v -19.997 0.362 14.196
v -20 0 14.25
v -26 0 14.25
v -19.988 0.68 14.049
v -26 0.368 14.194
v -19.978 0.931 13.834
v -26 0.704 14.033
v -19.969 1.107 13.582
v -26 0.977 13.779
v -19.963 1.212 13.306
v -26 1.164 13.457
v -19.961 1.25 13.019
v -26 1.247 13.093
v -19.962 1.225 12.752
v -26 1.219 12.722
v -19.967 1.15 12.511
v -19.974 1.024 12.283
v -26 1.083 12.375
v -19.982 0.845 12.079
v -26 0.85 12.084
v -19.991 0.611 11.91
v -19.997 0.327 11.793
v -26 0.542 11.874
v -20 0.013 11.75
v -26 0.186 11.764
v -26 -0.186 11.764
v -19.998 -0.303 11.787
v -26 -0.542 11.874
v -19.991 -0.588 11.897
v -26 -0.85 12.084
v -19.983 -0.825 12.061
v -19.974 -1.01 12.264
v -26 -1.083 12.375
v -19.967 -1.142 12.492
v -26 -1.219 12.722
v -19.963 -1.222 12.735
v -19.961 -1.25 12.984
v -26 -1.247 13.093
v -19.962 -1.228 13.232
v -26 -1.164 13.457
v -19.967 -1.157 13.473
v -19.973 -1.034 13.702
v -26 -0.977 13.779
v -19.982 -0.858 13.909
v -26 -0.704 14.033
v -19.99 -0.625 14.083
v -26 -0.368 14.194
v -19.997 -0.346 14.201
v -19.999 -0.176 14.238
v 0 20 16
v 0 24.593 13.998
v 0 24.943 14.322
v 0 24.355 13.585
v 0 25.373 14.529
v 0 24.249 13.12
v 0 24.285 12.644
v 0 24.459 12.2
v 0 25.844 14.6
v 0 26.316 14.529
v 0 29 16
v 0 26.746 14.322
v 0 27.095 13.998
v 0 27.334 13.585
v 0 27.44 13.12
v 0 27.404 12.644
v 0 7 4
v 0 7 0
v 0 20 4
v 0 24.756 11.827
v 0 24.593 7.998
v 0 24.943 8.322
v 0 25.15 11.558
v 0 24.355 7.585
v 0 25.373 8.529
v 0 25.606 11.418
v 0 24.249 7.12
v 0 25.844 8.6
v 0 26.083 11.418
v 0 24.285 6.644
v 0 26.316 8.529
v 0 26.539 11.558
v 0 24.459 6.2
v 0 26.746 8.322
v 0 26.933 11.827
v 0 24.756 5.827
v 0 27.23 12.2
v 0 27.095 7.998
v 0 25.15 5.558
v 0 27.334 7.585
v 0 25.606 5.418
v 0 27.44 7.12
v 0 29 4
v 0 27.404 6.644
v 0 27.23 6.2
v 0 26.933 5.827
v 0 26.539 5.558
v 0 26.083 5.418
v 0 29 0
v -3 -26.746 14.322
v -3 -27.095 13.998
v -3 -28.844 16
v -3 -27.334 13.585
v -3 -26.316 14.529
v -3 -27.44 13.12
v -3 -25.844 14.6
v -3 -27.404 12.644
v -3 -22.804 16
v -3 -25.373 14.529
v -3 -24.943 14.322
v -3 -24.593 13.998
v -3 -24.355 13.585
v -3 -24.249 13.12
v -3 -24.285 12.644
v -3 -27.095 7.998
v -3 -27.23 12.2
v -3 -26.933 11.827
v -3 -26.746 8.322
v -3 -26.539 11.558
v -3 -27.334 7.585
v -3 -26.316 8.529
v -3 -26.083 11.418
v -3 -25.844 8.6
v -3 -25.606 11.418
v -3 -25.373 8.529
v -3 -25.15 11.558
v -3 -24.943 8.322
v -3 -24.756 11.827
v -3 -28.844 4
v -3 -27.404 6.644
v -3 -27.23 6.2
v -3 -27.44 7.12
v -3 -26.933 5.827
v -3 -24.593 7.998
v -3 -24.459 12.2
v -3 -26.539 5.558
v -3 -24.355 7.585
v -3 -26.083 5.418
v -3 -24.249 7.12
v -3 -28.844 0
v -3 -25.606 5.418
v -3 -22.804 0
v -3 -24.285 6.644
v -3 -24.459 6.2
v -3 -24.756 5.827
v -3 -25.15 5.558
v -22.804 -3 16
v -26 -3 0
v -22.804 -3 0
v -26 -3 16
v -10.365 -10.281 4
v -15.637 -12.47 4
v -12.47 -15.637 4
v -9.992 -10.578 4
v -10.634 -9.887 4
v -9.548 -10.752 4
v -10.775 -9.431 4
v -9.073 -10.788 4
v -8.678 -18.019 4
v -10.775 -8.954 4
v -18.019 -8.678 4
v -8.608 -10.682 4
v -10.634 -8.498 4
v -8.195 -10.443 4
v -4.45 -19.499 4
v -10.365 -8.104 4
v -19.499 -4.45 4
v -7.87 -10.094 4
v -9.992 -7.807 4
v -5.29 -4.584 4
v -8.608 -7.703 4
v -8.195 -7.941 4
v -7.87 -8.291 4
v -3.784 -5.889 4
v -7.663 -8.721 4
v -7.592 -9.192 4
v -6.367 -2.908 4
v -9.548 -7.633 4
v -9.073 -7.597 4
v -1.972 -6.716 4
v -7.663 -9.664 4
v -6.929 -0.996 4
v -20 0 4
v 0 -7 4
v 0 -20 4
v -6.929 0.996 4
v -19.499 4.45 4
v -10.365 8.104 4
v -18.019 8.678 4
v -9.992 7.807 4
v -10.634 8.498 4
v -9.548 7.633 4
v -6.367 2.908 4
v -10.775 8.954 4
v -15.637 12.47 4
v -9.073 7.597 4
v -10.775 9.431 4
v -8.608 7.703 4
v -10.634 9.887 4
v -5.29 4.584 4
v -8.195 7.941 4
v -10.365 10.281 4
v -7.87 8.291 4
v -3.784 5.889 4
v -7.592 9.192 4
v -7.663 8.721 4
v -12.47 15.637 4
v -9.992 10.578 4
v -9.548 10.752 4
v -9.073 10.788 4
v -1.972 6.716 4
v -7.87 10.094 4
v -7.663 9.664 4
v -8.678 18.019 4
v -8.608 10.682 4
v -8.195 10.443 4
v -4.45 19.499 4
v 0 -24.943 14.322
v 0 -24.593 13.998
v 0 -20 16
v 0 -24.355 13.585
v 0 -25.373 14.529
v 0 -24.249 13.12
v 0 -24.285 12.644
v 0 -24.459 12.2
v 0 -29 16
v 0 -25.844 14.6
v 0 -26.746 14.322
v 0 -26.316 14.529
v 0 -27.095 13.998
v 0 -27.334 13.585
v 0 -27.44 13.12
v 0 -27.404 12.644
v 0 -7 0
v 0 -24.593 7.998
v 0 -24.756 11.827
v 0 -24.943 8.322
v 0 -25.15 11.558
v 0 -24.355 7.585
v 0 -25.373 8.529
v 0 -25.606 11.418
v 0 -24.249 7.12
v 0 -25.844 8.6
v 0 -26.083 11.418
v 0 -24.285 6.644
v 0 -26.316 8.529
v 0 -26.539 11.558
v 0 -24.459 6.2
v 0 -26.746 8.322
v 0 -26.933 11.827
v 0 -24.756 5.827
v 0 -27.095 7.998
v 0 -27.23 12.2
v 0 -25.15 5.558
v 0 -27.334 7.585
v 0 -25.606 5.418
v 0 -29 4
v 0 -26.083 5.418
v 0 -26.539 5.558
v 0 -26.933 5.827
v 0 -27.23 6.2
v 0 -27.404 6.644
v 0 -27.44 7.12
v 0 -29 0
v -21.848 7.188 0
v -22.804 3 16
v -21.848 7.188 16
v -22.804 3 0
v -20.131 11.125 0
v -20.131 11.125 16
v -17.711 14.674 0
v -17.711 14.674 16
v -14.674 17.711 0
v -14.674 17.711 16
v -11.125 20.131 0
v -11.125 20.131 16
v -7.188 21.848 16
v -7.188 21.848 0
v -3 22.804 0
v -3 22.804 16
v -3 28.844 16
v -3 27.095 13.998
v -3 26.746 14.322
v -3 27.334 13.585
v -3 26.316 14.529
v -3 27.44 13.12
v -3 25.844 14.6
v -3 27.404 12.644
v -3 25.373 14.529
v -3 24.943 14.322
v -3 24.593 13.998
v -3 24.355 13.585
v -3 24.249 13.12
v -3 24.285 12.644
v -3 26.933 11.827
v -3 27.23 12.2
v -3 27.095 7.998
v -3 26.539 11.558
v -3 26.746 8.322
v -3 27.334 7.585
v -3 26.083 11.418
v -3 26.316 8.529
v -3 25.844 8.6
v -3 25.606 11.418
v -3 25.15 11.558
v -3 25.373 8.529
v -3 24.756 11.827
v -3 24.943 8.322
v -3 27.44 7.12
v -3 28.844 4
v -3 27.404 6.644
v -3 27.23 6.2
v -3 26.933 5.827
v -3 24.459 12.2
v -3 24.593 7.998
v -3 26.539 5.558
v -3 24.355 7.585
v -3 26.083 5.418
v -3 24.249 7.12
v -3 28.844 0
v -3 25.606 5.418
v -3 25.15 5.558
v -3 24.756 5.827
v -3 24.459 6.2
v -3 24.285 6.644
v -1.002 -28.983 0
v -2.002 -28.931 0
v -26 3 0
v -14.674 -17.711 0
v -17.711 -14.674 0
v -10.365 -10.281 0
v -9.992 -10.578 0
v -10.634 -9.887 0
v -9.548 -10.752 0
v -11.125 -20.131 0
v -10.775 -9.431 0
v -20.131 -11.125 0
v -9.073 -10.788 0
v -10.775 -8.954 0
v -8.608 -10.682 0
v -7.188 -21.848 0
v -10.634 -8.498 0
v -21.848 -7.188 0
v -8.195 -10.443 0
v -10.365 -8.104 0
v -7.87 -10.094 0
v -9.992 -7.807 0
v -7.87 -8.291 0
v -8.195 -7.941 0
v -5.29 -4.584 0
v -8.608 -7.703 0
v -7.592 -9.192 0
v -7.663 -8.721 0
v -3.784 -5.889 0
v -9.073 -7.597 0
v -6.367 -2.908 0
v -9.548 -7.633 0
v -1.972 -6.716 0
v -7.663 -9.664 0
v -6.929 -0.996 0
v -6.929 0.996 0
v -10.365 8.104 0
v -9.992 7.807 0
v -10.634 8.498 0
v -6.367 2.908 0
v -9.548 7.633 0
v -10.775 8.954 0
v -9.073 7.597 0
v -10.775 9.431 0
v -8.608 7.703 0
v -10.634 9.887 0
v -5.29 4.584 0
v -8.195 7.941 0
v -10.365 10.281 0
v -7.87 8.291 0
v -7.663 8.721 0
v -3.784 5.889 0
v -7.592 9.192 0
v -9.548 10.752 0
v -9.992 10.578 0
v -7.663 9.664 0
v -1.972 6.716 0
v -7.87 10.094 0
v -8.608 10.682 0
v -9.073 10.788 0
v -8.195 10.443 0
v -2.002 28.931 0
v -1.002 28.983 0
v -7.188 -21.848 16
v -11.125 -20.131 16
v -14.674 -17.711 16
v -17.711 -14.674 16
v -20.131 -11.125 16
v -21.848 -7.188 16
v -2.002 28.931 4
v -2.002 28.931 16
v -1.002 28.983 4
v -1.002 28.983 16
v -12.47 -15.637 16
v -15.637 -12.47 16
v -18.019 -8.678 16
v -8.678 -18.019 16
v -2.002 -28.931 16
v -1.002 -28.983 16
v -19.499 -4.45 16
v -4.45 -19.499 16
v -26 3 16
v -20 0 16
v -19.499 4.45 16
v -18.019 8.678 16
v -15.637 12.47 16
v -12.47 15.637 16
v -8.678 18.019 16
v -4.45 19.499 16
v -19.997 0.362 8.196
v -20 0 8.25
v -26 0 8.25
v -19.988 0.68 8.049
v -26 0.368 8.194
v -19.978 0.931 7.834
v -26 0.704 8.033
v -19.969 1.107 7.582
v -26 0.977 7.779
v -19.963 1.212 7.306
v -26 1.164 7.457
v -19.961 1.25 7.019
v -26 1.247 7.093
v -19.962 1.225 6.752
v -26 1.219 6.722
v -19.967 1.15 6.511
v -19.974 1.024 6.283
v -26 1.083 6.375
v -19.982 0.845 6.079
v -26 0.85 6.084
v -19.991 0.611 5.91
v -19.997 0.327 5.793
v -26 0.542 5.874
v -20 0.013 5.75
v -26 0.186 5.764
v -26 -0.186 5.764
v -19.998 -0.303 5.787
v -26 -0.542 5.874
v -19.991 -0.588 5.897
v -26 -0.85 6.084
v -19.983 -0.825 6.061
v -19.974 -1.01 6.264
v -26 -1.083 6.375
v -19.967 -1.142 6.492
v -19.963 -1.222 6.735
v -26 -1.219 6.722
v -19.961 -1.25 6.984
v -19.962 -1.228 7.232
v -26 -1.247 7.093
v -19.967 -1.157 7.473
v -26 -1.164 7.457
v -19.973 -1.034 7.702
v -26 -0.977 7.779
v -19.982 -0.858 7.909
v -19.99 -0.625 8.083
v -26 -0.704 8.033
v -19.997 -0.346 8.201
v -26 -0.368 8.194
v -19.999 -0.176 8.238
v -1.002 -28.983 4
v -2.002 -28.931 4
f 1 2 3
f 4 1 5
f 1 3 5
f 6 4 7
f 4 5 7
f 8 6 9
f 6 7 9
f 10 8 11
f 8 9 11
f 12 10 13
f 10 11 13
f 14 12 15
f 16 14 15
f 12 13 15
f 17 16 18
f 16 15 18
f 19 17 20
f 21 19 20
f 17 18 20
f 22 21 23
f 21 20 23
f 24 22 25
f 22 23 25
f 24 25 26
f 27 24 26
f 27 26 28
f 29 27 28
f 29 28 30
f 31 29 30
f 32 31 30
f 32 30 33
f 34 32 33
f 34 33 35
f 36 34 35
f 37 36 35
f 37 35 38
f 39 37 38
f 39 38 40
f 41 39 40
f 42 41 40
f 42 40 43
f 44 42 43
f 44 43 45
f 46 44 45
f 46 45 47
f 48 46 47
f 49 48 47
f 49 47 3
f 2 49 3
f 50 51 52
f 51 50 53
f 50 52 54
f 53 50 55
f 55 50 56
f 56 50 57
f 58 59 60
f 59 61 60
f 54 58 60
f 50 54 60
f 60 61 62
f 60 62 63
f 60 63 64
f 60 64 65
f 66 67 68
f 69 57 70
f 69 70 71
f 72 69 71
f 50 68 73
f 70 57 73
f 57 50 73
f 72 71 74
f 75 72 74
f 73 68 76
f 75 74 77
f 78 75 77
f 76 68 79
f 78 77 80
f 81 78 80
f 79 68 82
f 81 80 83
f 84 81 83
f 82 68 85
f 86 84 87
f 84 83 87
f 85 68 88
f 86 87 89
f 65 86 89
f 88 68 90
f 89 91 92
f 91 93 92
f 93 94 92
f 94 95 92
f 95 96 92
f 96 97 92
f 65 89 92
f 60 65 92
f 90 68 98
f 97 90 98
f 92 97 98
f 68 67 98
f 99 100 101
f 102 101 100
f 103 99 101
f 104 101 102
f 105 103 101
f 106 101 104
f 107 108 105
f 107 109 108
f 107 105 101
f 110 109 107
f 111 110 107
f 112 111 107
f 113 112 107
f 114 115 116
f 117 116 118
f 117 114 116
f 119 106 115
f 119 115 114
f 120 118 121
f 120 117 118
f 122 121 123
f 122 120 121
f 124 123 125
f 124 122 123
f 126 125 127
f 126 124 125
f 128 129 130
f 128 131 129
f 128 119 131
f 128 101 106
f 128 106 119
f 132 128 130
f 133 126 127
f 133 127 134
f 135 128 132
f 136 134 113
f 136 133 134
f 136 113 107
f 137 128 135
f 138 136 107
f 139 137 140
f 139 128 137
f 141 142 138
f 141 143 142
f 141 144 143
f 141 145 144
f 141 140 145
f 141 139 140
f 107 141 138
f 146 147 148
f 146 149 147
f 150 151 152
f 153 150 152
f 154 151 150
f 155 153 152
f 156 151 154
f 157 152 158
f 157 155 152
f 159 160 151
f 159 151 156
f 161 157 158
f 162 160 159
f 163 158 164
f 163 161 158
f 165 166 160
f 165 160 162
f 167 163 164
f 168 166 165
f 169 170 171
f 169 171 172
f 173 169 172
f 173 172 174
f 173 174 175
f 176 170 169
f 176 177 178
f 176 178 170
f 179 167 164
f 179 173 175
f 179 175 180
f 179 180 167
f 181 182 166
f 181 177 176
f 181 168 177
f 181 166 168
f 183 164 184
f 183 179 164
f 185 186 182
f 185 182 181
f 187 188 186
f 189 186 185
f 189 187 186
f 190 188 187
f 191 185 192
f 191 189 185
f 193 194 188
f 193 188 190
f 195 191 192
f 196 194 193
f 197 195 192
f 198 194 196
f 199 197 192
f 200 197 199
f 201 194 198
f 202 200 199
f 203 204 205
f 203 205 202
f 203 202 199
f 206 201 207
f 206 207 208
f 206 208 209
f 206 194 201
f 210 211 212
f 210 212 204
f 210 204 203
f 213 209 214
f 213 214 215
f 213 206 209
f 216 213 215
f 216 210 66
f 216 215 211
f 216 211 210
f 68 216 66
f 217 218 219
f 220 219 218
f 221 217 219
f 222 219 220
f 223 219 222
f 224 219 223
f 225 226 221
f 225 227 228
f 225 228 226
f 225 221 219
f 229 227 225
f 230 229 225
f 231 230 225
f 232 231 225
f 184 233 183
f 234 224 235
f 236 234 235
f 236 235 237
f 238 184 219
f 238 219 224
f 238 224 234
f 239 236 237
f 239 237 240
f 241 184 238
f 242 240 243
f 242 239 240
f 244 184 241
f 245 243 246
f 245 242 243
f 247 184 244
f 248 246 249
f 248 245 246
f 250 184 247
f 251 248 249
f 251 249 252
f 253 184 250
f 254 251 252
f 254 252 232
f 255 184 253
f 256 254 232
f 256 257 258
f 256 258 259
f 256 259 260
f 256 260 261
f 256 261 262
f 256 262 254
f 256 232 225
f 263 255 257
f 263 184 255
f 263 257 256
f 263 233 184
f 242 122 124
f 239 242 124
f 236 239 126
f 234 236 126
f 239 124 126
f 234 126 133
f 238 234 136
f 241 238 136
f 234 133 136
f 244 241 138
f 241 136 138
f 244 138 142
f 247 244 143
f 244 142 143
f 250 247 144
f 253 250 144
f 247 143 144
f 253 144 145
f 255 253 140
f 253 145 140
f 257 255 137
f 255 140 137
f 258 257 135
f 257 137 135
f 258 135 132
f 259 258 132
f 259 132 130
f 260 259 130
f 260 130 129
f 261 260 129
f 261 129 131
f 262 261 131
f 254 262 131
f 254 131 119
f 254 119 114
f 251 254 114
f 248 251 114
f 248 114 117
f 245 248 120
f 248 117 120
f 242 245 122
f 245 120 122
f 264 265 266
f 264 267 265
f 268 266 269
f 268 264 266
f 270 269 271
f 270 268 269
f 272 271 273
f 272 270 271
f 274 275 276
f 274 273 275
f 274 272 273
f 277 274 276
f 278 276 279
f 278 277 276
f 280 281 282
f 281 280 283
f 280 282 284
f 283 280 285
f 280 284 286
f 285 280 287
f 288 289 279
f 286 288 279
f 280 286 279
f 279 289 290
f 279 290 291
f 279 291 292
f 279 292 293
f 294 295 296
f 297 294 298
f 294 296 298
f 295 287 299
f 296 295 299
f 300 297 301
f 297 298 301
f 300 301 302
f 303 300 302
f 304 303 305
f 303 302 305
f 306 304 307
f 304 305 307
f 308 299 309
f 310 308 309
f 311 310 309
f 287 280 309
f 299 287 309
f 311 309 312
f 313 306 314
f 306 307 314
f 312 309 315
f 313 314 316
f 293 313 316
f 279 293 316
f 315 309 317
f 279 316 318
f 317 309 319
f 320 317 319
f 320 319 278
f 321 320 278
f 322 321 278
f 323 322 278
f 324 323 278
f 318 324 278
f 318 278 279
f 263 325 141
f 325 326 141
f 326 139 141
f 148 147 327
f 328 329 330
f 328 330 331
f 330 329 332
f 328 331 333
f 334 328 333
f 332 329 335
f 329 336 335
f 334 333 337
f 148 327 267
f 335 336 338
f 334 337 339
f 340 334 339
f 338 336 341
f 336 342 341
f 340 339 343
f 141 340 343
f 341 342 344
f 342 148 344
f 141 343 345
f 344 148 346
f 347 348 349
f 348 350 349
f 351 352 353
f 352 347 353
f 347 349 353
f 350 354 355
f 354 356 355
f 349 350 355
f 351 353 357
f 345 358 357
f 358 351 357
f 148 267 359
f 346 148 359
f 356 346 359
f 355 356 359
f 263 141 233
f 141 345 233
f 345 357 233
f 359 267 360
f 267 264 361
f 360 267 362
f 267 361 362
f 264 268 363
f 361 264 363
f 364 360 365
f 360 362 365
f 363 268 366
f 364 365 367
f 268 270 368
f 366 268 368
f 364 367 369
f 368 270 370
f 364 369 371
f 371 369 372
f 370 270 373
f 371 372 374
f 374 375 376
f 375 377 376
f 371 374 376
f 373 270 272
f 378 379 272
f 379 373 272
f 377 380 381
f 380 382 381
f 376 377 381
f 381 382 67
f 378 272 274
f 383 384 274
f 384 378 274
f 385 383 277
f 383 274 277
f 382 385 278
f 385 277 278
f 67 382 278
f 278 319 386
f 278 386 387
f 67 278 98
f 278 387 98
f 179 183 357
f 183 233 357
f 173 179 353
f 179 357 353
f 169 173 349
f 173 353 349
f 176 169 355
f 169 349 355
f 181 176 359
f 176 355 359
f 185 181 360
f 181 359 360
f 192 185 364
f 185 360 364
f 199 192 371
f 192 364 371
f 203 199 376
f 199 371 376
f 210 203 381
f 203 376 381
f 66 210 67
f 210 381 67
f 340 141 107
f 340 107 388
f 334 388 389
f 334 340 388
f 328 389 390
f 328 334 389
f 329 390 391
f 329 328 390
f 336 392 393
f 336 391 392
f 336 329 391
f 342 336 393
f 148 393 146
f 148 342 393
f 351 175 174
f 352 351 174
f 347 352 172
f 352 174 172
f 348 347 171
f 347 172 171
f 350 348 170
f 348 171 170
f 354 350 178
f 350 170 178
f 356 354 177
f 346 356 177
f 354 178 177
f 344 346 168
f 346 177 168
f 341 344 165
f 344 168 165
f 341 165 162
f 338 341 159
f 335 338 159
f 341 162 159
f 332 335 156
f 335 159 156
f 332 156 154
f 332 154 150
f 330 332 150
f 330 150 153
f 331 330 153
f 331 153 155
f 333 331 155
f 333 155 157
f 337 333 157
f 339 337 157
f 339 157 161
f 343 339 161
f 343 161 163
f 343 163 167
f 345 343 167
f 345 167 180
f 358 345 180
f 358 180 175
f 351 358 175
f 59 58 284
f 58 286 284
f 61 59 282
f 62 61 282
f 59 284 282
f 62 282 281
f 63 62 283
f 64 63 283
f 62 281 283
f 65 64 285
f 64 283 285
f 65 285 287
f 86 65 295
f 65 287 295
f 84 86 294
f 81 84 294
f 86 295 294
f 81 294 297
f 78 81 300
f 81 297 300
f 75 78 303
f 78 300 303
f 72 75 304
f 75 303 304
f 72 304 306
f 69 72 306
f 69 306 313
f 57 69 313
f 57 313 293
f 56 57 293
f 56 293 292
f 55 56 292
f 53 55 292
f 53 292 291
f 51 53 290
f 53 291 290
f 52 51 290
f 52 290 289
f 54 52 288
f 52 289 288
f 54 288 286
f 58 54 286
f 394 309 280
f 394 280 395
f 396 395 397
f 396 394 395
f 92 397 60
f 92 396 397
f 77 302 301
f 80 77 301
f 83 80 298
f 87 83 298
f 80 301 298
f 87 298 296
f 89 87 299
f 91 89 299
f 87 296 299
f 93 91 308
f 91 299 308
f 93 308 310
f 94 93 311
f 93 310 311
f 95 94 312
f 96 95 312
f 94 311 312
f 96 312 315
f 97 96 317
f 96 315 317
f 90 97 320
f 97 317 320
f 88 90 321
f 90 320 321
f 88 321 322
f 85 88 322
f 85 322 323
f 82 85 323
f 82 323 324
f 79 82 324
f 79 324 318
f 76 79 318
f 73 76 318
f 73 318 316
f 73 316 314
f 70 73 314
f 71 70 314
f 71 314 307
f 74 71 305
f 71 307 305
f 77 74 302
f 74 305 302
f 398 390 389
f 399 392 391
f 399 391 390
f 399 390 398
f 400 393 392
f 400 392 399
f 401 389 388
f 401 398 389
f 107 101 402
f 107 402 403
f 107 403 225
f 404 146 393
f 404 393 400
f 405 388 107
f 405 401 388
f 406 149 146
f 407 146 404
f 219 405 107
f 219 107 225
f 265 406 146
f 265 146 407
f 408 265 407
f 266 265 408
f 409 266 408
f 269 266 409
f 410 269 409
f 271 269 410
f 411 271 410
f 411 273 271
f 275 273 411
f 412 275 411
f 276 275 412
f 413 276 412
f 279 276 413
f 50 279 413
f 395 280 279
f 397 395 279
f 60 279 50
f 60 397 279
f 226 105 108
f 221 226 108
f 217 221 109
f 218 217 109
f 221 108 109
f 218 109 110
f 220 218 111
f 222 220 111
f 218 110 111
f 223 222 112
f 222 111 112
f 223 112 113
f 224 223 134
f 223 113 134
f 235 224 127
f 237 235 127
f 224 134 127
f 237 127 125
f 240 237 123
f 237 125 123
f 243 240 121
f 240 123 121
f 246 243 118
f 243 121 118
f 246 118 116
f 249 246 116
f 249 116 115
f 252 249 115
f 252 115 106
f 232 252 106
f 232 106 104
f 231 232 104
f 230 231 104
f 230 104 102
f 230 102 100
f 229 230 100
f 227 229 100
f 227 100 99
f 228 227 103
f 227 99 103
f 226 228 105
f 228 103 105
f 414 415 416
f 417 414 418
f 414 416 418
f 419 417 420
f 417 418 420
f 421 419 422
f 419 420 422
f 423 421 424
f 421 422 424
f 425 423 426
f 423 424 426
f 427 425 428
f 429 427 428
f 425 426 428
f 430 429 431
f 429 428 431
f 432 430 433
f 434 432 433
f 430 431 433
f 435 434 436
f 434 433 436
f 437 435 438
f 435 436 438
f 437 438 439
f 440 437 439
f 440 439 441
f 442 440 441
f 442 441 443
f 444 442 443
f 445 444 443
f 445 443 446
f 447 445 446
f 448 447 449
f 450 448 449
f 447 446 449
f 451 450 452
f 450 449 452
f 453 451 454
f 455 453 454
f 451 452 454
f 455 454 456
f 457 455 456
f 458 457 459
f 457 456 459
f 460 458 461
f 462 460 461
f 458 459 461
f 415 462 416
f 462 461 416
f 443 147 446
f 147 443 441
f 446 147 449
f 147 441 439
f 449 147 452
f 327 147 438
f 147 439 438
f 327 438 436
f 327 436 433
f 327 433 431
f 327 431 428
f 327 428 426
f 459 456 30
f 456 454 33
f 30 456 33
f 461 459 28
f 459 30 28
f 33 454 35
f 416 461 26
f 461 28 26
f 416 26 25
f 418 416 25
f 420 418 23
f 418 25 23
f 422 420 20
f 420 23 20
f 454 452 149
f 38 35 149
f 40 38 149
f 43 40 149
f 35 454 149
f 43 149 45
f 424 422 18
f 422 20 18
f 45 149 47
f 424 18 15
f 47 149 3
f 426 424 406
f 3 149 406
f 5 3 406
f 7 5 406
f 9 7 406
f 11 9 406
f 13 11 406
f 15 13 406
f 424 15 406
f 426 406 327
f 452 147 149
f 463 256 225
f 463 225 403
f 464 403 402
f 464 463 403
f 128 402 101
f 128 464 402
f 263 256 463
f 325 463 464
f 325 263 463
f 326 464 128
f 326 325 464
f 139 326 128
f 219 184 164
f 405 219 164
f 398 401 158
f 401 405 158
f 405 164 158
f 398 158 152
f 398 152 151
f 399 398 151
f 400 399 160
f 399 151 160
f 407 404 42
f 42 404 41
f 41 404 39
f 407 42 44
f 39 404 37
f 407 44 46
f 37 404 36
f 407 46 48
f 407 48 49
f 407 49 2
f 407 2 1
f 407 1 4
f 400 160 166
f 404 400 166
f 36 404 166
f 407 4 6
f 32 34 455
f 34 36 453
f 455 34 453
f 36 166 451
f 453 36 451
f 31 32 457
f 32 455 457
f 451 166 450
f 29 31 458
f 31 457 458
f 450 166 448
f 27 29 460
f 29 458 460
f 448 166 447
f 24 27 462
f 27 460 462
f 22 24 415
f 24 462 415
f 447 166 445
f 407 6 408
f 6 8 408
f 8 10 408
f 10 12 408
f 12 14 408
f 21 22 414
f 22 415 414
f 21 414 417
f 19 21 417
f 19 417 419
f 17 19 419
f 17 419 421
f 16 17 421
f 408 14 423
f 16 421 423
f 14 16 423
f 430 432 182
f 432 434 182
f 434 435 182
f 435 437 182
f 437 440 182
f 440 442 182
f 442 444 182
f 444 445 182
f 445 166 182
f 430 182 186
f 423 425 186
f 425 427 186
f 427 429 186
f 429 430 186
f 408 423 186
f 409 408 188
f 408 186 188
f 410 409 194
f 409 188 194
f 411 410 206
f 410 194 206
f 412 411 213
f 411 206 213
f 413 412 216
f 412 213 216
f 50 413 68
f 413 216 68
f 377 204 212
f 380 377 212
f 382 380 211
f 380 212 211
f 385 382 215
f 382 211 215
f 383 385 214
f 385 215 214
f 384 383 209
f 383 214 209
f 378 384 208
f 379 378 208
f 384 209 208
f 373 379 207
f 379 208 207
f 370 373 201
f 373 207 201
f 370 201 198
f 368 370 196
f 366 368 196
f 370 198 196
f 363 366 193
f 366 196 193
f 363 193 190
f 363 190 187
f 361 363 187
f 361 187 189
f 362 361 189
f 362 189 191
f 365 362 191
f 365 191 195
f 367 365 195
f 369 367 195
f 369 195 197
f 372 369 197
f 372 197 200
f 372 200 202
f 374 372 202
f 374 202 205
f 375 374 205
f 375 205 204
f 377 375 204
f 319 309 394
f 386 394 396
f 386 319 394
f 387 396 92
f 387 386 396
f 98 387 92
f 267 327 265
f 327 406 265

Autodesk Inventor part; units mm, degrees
ref_plane "YZ Plane" through (0, 0, 0) normal (1, 0, 0) x (0, 1, 0)
ref_plane "XZ Plane" through (0, 0, 0) normal (0, 1, 0) x (-1, 0, 0)
ref_plane "XY Plane" through (0, 0, 0) normal (0, 0, 1) x (1, 0, 0)
sketch "스케치1" plane through (0, 0, 0) normal (0, 0, 1) x (1, 0, 0)
  arc A0 (0, 7) -> (0, -7) centre (0, 0) ccw
  arc A1 (0, 23) -> (0, -23) centre (0, 0) ccw
  line L0 (0, 0) -> (0, 23)
  line L1 (0, 0) -> (0, -23)
  dimension "d0" = 14
  dimension "d1" = 46
extrude "돌출1" add sketch "스케치1" along normal blind 4 contours A0 L1 A1 L0
sketch "스케치2" plane through (0, 0, 4) normal (0, 0, 1) x (1, 0, 0)
  arc A0 (0, 20) -> (0, -20) centre (0, 0) ccw
  arc A1 (0, 23) -> (0, -23) centre (0, 0) ccw
  line L0 (0, 20) -> (0, 29)
  line L1 (0, 0) -> (0, -29)
  arc A2 (-3, -28.8444) -> (0, -29) centre (0, 0) ccw
  arc A3 (0, 29) -> (-3, 28.8444) centre (0, 0) ccw
  line L2 (-3, 28.8444) -> (-3, 19.7737)
  line L3 (-3, -19.7737) -> (-3, -22.8035)
  line L4 (-3, -28.8444) -> (-3, -19.7737)
  line L5 (-3, 19.7737) -> (-3, 28.8444)
  line L6 (-3, 22.8035) -> (-3, 19.7737)
  line L7 (-3, -19.7737) -> (-3, -28.8444)
  line L8 (0, -29) -> (0, -20)
  line L9 (0, 20) -> (0, 29)
  line L10 (0, 29) -> (0, 20)
  line L11 (0, -20) -> (0, -29)
  dimension "d4" = 40
  dimension "d5" = 46
  dimension "d6" = 29
  dimension "d7" = 29
extrude "돌출2" add sketch "스케치2" along normal blind 12
sketch "스케치3" plane through (-3, -28.8444, 4) normal (-1, 0, 0) x (0, 0, 1)
  line L0 (0, 51.6479) -> (12, 51.6479) projected
  line L1 (12, 57.6888) -> (12, 51.6479) projected
  line L2 (0, 57.6888) -> (12, 57.6888) projected
  line L3 (0, 57.6888) -> (0, 51.6479) projected
  line L4 (12, 6.0409) -> (0, 6.0409) projected
  line L5 (0, 6.0409) -> (0, 0) projected
  line L6 (0, 0) -> (12, 0) projected
  line L7 (12, 6.0409) -> (12, 0) projected
  circle A0 centre (9, 3) radius 1.6
  circle A1 centre (3, 3) radius 1.6
  circle A2 centre (9, 54.6888) radius 1.6
  circle A3 centre (3, 54.6888) radius 1.6
  point P0 (-4, 28.8444)
  dimension "d16" = 3.2
  dimension "d17" = 3.2
  dimension "d18" = 3.2
  dimension "d19" = 3.2
  dimension "d20" = 3
  dimension "d21" = 3
  dimension "d22" = 3
  dimension "d23" = 3
  dimension "d24" = 3
  dimension "d25" = 3
  dimension "d26" = 3
  dimension "d27" = 3
extrude "돌출3" cut sketch "스케치3" against normal up to surface (3 mm away) contours A0 | A1 | A2 | A3
sketch "스케치5" plane through (0, 0, 16) normal (0, 0, 1) x (1, 0, 0)
  circle A0 centre (0, 0) radius 23
  arc A1 (-3, 22.8035) -> (-3, -22.8035) centre (0, 0) ccw projected
  line L0 (-23, 0) -> (-26, 0)
  line L1 (-23, 0) -> (-20, 0) construction
  line L2 (-26, 0) -> (-26, -3)
  line L3 (-26, -3) -> (-22.8035, -3)
  line L4 (-26, 0) -> (-26, 3)
  line L5 (-26, 0) -> (-23, 0) construction
  line L6 (-26, 3) -> (-22.8035, 3)
  dimension "d36" = 46
  dimension "d37" = 3
  dimension "d38" = 180
  dimension "d39" = 3
  dimension "d40" = 90
  dimension "d41" = 90
  dimension "d42" = 3
  dimension "d43" = 90
extrude "돌출5" add sketch "스케치5" against normal blind 16 contours A0 L0 L4 L6 | L3 L2 L0 A0
sketch "스케치6" plane through (-26, -3, 16) normal (-1, 0, 0) x (0, 0, 1)
  line L0 (0, 6) -> (0, 0) projected
  line L1 (0, 6) -> (-16, 6) projected
  line L2 (-16, 0) -> (-16, 6) projected
  line L3 (0, 0) -> (-16, 0) projected
  circle A0 centre (-3, 3) radius 1.25
  circle A1 centre (-9, 3) radius 1.25
  point P0 (-16, 3)
  dimension "d46" = 2.5
  dimension "d47" = 2.5
  dimension "d48" = 3
  dimension "d49" = 7
  dimension "d50" = 3
  dimension "d51" = 3
extrude "돌출6" cut sketch "스케치6" against normal blind 8 contours A0 | A1
sketch "스케치7" plane through (0, 0, 4) normal (0, 0, 1) x (1, 0, 0)
  circle A0 centre (0, 0) radius 13
  line L0 (0, 0) -> (-9.1924, 9.1924)
  line L1 (0, 0) -> (13, 0) construction
  line L2 (0, 0) -> (-9.1924, -9.1924)
  line L3 (0, 0) -> (13, 0) construction
  circle A1 centre (-9.1924, 9.1924) radius 1.6
  circle A2 centre (-9.1924, -9.1924) radius 1.6
  dimension "d54" = 26
  dimension "d55" = 135
  dimension "d56" = 135
  dimension "d57" = 3.2
  dimension "d58" = 3.2
extrude "돌출7" cut sketch "스케치7" against normal up to surface (4 mm away) contours A1 L0 A0 | A0 A1 | A2 A0 | A0 L2 A2 | L0 A1 A0 | A0 A2 L2
sketch "스케치8" plane through (0, 0, 0) normal (0, 0, -1) x (-1, 0, 0)
  arc A0 (3, 22.8035) -> (0, 23) centre (0, 0) ccw projected
  line L0 (3, 28.8444) -> (3, 22.8035) projected
  arc A1 (3, 28.8444) -> (0, 29) centre (0, 0) ccw projected
  line L1 (0, 23) -> (0, 29) projected
  arc A2 (0, -23) -> (3, -22.8035) centre (0, 0) ccw projected
  line L2 (0, -29) -> (0, -23) projected
  arc A3 (0, -29) -> (3, -28.8444) centre (0, 0) ccw projected
  line L3 (3, -22.8035) -> (3, -28.8444) projected
extrude "돌출8" add sketch "스케치8" against normal blind 4
properties part number "조인트4링크2고정부" material "알루미늄 6061"
